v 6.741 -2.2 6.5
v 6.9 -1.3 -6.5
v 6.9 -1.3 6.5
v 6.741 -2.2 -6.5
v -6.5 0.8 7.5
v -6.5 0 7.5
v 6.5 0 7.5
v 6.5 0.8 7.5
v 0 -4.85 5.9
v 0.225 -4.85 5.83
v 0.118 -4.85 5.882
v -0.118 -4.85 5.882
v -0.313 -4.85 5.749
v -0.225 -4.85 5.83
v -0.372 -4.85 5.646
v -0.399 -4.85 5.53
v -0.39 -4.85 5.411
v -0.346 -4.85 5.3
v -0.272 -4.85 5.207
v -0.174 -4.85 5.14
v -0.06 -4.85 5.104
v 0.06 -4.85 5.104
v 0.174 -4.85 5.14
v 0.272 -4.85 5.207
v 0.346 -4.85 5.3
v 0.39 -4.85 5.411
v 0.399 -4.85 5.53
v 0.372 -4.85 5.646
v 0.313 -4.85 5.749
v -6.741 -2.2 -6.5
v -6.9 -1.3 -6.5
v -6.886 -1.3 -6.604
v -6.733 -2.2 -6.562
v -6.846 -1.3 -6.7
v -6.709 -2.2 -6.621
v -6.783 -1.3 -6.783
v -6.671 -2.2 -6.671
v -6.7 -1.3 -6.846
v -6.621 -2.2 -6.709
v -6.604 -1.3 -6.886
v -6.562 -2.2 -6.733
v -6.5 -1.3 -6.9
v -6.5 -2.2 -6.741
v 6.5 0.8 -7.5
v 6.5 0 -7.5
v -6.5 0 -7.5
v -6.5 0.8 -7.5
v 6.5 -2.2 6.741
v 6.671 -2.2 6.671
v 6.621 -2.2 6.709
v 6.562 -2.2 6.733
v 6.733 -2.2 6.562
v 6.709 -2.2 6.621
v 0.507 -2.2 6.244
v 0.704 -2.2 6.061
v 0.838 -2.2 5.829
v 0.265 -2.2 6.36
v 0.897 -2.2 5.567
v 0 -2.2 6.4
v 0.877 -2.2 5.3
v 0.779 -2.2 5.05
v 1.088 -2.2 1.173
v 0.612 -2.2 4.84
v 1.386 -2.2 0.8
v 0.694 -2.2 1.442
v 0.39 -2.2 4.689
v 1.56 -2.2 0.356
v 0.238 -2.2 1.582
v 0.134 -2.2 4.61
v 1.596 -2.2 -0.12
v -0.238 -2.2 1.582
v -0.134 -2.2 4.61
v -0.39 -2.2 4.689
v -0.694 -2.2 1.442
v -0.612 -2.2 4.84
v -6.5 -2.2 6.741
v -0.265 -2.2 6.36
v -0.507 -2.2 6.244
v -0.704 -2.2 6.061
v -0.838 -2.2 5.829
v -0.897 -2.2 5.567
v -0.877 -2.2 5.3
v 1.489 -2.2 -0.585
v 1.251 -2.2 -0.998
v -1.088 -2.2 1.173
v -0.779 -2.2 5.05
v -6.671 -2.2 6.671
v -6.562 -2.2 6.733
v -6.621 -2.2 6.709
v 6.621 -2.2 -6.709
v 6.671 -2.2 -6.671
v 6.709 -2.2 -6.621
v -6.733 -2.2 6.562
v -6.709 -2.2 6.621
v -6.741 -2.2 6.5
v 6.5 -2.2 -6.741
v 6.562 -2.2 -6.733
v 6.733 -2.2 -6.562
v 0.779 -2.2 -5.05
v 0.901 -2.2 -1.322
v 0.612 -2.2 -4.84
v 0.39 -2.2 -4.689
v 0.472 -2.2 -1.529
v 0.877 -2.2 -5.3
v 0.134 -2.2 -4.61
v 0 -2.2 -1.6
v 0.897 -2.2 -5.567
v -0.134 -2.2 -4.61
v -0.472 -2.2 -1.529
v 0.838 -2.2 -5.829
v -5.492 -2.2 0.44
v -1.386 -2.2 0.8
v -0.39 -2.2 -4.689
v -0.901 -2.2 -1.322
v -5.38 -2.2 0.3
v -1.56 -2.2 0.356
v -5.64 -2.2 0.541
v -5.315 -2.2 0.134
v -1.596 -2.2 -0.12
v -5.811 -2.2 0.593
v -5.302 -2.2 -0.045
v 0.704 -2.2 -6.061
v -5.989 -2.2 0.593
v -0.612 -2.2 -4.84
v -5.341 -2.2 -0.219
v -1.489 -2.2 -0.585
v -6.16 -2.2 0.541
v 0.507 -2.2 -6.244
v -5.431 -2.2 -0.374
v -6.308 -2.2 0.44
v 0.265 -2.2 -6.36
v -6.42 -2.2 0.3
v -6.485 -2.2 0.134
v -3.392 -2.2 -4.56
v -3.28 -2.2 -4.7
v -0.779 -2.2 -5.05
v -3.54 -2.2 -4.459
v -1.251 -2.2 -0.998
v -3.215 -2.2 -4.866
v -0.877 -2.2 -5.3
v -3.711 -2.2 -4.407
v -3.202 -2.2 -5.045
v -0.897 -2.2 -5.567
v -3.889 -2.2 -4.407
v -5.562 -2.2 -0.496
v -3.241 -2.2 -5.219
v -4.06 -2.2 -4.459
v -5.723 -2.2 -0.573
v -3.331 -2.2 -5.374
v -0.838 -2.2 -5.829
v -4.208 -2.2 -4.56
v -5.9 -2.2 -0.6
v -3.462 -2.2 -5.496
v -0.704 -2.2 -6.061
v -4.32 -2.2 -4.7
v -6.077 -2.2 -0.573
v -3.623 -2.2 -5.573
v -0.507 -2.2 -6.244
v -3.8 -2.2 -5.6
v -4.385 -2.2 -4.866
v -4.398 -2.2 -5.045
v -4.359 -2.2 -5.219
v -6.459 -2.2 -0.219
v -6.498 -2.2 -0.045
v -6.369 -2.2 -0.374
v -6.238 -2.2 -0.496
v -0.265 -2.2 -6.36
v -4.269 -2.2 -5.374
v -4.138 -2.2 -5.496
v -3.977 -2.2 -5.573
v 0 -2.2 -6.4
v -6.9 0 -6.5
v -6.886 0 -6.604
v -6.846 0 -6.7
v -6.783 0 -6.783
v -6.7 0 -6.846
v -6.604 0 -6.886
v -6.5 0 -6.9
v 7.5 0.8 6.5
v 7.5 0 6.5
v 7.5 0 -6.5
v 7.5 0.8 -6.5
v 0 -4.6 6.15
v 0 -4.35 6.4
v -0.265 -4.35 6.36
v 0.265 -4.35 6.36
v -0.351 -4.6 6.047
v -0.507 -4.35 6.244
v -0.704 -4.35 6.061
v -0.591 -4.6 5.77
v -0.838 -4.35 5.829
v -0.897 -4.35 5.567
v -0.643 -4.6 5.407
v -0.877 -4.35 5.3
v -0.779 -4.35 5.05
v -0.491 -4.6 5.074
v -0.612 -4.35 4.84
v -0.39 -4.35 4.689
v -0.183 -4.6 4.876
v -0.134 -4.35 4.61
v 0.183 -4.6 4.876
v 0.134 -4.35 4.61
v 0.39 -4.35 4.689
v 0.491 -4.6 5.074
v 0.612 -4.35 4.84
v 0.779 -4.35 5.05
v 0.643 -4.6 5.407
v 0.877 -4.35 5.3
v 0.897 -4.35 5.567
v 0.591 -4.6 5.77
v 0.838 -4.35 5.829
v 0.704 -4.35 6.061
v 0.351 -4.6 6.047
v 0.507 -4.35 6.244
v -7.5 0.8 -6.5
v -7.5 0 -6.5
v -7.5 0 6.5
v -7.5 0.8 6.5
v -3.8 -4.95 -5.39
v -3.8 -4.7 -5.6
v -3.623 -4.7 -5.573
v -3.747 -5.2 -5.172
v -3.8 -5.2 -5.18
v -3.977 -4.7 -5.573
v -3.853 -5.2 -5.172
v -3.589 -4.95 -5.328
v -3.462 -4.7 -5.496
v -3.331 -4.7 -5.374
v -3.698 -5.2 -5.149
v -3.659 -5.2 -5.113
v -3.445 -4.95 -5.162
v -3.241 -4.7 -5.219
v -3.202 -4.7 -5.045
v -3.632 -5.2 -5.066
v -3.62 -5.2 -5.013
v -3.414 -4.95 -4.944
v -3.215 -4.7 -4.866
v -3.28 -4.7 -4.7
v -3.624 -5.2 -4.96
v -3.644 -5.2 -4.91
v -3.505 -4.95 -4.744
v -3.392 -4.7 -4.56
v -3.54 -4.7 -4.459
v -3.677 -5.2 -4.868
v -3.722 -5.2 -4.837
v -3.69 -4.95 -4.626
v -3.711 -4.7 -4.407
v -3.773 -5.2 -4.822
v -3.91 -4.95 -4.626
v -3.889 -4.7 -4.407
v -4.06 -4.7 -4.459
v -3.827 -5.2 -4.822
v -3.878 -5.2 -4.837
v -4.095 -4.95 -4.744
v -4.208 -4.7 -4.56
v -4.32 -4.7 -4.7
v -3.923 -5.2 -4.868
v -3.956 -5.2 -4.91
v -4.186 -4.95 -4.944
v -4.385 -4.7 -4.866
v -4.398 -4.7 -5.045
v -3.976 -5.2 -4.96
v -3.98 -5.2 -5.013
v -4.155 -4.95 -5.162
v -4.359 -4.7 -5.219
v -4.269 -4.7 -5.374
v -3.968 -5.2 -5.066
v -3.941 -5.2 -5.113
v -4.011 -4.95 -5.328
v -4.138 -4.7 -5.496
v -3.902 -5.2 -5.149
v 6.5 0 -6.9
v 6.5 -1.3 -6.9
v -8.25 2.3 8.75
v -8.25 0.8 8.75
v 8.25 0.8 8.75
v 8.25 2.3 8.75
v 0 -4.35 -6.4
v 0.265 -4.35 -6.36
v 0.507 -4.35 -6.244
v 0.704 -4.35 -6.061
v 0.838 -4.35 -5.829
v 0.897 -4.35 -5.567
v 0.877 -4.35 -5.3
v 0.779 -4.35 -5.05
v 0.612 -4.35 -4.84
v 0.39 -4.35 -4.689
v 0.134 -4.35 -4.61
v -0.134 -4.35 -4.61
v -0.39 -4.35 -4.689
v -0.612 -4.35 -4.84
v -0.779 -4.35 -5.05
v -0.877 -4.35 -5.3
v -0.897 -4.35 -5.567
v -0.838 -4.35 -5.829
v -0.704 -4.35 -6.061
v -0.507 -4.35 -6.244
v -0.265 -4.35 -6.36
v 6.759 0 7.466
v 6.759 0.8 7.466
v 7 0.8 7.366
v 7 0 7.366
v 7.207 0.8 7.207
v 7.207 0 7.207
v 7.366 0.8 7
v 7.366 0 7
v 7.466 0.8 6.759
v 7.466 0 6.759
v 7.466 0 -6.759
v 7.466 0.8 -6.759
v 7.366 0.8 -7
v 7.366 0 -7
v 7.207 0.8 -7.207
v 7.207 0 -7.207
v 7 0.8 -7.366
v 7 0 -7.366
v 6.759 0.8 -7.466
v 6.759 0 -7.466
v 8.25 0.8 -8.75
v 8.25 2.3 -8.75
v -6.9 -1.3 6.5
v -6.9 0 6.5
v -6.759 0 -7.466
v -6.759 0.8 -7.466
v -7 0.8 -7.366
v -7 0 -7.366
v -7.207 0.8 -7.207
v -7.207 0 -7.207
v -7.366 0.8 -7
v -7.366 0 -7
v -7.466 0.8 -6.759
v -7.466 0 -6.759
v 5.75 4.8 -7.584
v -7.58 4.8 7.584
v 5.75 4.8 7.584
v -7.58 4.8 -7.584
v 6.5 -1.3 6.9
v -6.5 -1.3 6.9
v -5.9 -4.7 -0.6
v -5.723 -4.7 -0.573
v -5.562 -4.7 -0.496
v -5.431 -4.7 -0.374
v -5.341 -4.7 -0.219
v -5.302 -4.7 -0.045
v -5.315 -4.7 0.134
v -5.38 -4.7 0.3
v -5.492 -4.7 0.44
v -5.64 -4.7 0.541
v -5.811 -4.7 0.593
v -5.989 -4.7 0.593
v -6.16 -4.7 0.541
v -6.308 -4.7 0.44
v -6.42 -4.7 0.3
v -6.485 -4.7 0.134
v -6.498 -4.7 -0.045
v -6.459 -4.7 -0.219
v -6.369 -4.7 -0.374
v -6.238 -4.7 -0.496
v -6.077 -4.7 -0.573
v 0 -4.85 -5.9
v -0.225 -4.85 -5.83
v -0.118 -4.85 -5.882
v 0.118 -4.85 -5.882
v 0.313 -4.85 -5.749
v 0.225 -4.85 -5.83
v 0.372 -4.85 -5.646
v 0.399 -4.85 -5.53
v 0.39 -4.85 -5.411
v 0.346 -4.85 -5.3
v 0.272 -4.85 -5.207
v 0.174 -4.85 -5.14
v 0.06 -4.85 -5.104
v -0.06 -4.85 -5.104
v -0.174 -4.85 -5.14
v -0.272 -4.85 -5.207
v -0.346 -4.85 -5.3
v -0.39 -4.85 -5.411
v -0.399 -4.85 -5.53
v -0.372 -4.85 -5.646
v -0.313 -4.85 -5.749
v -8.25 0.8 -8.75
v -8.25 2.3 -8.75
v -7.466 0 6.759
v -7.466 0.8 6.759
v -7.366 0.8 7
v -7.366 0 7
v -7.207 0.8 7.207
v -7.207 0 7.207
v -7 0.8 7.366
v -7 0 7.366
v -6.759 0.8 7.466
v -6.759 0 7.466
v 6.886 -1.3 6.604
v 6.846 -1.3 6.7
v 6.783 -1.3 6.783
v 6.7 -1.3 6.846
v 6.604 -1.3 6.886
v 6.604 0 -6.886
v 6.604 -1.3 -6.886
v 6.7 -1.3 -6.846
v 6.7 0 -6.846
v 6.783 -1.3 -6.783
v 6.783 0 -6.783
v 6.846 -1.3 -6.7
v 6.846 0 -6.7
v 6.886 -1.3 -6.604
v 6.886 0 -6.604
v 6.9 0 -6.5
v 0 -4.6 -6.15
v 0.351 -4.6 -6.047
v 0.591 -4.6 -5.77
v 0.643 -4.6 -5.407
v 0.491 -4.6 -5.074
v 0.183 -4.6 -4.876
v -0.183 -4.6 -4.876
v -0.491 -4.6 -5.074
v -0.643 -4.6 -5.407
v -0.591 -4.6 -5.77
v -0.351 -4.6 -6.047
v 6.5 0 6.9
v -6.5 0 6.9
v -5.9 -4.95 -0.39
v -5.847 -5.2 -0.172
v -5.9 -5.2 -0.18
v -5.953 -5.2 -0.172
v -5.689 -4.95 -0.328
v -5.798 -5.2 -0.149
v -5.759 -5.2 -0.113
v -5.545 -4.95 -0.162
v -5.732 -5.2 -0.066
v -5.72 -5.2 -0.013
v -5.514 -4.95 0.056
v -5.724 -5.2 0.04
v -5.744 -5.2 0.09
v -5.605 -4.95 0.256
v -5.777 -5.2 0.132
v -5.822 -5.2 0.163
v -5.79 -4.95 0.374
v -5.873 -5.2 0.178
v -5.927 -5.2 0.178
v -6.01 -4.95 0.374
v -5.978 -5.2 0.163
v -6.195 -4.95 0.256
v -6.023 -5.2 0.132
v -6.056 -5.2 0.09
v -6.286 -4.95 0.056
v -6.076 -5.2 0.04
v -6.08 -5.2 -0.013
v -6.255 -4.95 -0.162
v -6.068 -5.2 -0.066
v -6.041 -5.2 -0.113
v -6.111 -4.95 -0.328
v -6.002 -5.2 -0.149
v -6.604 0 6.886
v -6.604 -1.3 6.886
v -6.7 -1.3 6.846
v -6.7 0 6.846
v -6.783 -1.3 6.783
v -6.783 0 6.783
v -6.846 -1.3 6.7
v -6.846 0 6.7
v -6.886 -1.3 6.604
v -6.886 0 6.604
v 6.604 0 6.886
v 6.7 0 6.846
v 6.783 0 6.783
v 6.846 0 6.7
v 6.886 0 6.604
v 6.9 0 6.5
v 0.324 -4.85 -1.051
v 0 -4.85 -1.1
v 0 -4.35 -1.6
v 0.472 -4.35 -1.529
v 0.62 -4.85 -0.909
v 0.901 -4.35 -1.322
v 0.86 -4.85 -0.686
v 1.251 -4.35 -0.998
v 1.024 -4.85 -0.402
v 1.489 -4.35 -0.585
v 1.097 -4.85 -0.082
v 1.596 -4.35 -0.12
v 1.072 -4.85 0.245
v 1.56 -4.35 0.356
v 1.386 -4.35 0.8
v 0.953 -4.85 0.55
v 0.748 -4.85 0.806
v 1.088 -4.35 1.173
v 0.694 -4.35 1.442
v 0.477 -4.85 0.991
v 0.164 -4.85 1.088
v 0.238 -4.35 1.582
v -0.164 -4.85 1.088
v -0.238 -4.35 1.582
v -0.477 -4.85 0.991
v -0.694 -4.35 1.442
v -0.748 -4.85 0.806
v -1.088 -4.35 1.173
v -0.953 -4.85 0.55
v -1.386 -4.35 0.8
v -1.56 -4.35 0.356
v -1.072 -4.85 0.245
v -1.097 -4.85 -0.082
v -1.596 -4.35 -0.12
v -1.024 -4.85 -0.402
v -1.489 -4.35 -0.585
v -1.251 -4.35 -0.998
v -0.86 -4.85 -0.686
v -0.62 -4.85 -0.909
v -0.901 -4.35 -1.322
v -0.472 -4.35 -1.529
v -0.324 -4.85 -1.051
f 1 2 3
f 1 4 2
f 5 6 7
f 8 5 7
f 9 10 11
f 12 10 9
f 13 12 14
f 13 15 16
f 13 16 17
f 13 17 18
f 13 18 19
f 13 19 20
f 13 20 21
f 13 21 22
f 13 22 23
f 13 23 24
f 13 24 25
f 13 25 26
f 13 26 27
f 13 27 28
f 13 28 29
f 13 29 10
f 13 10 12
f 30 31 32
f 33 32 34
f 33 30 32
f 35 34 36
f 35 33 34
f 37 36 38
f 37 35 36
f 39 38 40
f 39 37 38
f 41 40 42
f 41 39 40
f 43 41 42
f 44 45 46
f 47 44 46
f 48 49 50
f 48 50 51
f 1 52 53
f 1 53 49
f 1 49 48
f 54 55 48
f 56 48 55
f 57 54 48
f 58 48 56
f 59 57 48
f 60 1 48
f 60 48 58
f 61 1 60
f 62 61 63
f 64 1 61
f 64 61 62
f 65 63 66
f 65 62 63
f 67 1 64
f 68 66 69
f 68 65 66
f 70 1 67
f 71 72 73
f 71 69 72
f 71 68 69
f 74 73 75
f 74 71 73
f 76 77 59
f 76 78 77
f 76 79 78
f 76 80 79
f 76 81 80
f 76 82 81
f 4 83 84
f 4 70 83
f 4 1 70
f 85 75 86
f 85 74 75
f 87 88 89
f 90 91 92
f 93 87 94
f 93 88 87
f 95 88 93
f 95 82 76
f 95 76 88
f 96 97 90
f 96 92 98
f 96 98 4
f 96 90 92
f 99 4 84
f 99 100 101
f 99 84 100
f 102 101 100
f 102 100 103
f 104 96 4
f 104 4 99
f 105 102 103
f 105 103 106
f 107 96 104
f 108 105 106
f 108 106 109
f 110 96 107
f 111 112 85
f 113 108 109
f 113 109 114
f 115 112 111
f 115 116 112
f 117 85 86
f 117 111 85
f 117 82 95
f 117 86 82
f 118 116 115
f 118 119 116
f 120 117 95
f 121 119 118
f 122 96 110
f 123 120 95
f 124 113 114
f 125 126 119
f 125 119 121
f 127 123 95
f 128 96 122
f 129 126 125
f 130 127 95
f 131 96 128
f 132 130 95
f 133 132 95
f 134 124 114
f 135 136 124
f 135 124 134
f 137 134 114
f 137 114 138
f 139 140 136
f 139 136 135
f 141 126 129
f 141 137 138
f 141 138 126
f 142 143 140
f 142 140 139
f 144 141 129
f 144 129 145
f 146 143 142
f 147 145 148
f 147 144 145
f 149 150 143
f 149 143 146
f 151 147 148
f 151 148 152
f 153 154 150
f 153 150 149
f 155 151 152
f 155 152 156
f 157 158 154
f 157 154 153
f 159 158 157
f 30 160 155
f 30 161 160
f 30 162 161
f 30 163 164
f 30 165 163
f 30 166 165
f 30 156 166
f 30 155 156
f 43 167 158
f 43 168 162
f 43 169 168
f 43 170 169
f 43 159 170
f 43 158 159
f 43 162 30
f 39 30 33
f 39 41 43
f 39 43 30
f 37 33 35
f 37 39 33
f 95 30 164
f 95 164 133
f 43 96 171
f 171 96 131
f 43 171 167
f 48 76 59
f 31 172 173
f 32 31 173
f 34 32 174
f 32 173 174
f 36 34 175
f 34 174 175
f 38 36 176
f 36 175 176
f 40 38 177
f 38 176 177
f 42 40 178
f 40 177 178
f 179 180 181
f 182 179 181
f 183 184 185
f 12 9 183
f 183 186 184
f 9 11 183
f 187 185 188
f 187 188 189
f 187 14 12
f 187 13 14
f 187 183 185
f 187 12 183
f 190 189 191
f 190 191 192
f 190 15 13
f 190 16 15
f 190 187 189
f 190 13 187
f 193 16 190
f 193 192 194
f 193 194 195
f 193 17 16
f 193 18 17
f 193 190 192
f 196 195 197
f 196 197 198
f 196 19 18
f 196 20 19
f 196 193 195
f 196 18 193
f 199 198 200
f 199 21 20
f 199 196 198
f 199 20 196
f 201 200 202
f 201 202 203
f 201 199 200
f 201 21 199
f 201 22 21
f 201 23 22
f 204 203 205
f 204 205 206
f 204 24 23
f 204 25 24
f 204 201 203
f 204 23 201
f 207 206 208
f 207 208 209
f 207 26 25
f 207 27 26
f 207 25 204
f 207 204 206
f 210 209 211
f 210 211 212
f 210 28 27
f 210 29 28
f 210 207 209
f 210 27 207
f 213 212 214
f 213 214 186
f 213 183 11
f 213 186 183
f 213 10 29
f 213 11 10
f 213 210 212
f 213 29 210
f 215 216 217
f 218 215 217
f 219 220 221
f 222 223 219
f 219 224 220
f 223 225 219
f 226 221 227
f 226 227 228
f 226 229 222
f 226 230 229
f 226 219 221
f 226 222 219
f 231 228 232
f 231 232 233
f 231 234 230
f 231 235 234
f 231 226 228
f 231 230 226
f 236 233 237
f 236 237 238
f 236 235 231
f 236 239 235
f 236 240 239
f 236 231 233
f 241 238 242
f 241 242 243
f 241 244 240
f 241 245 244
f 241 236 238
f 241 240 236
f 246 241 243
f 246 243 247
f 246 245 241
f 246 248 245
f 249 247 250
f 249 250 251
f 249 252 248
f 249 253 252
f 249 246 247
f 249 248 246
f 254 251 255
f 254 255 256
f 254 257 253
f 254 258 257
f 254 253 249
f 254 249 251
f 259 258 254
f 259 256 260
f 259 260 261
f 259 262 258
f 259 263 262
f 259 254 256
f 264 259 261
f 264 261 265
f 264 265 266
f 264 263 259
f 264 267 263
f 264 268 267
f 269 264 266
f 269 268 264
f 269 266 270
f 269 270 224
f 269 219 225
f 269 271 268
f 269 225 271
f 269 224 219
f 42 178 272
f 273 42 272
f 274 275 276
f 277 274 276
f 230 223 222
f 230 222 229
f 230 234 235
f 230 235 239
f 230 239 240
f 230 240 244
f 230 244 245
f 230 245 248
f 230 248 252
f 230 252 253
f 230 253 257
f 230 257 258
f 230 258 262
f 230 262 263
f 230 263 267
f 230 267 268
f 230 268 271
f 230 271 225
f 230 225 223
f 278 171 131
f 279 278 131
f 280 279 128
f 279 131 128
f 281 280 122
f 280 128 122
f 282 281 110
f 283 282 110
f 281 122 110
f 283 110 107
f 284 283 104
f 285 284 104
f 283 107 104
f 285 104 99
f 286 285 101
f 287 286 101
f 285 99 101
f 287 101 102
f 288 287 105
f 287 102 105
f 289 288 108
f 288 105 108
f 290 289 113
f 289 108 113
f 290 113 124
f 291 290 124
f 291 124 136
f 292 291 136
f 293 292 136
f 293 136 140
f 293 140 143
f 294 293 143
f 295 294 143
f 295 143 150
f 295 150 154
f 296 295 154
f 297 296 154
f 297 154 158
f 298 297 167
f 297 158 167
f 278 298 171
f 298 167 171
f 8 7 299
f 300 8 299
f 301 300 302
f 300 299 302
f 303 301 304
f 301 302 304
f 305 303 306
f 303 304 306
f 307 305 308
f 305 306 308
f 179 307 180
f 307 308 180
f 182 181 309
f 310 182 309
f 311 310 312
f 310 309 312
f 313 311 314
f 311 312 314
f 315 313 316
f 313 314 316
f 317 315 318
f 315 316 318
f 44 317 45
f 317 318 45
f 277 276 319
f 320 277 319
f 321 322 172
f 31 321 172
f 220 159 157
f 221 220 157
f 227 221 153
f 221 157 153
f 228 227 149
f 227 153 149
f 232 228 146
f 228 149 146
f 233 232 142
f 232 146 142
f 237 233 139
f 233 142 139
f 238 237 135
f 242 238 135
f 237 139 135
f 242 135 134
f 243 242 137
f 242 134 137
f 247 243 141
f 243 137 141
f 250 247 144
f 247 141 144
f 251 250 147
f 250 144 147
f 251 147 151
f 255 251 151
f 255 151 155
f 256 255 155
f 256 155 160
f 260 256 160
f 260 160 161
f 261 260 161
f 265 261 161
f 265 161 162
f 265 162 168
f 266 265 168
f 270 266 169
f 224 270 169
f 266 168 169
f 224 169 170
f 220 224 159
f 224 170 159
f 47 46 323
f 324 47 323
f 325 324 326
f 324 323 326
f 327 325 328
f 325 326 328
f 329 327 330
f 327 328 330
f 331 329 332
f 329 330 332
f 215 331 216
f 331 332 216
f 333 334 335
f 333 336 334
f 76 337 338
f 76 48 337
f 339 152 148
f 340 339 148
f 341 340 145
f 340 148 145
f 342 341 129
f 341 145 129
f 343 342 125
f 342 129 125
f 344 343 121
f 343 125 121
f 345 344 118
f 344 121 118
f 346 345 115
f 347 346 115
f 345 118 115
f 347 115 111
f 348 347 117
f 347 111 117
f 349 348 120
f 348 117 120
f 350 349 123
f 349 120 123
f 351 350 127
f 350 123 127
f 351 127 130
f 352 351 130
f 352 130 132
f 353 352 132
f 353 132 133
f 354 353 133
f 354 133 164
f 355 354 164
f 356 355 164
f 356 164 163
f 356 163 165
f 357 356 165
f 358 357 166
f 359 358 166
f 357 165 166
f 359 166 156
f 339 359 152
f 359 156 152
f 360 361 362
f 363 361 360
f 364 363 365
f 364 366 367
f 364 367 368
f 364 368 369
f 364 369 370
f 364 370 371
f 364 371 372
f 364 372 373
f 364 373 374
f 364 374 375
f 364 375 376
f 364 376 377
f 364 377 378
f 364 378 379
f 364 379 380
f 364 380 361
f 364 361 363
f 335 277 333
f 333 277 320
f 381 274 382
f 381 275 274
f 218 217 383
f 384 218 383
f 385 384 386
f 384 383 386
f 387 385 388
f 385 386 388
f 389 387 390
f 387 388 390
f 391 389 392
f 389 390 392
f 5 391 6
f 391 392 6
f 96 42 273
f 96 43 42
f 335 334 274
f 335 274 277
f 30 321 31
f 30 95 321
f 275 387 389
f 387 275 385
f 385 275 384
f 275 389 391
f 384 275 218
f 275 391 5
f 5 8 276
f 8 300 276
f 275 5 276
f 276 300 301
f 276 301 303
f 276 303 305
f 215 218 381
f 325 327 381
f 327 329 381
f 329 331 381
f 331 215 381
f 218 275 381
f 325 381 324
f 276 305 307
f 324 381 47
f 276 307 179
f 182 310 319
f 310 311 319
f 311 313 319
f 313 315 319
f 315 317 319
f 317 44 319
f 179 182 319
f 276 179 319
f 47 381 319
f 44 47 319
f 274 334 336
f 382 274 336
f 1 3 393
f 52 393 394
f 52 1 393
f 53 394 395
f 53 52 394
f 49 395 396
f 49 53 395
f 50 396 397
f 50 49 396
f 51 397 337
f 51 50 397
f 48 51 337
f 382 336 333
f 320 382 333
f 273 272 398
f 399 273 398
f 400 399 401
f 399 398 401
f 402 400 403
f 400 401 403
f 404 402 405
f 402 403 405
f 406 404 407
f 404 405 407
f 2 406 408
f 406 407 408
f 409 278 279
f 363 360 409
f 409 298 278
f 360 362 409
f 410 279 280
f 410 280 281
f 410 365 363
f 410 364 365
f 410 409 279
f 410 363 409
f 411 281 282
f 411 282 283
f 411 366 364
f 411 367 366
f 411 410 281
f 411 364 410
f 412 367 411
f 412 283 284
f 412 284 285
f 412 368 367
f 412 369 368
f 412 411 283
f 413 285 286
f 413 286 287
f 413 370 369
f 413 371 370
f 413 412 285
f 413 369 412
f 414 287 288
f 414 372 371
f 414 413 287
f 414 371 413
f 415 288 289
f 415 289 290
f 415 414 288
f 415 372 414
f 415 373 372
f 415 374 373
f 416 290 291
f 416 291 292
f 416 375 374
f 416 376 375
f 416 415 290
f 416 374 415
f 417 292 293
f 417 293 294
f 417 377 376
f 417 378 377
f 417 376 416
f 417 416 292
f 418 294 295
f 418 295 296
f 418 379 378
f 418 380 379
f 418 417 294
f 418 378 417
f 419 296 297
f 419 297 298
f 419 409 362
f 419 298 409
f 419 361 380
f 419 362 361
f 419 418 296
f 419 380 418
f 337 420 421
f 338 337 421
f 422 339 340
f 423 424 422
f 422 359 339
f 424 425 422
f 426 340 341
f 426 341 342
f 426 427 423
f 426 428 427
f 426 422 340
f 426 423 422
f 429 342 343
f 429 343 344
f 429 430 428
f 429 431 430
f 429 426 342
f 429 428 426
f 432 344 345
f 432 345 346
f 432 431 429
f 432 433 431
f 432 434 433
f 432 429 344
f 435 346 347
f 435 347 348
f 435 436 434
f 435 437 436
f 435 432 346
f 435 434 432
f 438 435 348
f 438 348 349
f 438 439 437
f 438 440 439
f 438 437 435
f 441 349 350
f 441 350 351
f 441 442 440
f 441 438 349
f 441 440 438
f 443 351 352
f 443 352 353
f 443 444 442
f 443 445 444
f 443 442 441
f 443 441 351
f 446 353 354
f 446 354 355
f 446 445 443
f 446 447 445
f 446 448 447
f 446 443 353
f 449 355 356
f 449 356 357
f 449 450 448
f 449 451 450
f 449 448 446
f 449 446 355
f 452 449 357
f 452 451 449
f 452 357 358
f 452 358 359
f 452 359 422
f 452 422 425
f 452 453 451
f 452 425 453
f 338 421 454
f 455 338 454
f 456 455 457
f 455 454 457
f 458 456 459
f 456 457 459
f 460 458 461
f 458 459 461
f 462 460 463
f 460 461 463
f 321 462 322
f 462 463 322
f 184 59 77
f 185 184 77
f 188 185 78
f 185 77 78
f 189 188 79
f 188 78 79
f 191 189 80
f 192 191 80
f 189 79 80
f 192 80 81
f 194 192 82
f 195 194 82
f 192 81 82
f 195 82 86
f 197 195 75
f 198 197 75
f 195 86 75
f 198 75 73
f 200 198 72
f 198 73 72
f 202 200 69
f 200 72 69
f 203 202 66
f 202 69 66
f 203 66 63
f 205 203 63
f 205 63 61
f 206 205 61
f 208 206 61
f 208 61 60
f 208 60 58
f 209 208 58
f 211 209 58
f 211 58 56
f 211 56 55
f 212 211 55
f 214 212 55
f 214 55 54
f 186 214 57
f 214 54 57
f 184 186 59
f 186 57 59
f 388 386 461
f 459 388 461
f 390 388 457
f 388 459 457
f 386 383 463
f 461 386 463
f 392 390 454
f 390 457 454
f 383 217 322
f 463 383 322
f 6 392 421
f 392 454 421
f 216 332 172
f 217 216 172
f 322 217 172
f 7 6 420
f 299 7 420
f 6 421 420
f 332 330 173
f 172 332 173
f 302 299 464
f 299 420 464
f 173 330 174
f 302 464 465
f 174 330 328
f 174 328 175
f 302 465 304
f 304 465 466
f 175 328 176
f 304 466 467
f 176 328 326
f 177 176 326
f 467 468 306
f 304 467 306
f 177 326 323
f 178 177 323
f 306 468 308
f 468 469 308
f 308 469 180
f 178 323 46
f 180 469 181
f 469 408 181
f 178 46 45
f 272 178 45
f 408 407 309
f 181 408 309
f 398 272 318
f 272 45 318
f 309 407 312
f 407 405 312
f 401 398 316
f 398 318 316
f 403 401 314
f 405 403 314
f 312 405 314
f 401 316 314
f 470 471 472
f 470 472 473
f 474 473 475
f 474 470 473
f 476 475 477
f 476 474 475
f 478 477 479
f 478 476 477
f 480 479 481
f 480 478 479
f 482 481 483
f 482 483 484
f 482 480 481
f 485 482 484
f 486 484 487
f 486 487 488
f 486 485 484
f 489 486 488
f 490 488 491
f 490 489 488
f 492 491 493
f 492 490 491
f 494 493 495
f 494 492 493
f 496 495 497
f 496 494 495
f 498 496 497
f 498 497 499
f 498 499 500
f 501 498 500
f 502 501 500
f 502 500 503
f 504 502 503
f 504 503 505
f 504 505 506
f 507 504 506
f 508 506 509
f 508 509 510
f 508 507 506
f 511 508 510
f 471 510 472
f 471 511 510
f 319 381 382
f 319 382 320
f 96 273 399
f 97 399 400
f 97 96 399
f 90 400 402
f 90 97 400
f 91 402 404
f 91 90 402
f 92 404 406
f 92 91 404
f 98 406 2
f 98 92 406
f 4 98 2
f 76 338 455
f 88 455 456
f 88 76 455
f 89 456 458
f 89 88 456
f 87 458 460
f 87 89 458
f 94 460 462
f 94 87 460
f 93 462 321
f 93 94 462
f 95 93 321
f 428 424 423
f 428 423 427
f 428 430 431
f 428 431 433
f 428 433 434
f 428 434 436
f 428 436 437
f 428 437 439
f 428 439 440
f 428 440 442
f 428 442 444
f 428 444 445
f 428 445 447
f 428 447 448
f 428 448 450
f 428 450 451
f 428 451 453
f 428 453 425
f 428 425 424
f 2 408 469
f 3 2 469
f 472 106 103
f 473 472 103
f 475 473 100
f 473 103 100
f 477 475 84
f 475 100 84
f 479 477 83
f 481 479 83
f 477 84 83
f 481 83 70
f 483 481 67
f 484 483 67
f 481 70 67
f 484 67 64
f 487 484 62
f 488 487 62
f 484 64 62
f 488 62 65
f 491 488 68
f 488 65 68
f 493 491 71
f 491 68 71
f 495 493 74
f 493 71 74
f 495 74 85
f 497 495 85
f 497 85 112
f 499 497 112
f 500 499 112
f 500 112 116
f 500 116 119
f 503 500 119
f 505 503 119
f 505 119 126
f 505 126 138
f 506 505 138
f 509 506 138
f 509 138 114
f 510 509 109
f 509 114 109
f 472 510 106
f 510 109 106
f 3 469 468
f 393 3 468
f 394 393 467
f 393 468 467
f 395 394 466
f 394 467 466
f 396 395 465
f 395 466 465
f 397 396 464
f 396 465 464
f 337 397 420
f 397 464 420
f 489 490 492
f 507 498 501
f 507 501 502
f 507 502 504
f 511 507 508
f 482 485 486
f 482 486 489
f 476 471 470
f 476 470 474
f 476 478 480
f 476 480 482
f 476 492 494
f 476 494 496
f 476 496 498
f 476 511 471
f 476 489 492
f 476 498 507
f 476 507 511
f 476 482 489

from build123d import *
from OCP.BRepFilletAPI import BRepFilletAPI_MakeChamfer

# Parameters (mm, degrees)
BOSS_EXTRUDE1_DEPTH = 0.8
BOSS_EXTRUDE2_DEPTH = 1.3
BOSS_EXTRUDE3_DEPTH = 0.9
BOSS_EXTRUDE3_TAPER = 10
SKETCH4_R           = 1.6
SKETCH4_R_2         = 0.9
BOSS_EXTRUDE4_DEPTH = 2.65
SKETCH5_R           = 0.6
BOSS_EXTRUDE5_DEPTH = 3
CHAMFER1_SIZE       = 0.5
CHAMFER1_SIZE2      = 0.419549816
CHAMFER2_SIZE       = 0.5
SKETCH6_W           = 16.5
SKETCH6_H           = 17.5
BOSS_EXTRUDE6_DEPTH = 4
CHAMFER3_SIZE       = 2.5
CHAMFER4_SIZE       = 2.5
CHAMFER4_SIZE2      = 1.165769145
CHAMFER5_SIZE       = 2.5
CHAMFER5_SIZE2      = 0.669872981


with BuildPart() as part:
    # Sketch1 → Boss-Extrude1 (new body)
    with BuildSketch(Plane(origin=(0, 0, 0), x_dir=(1, 0, 0), z_dir=(0, 1, 0))):
        with BuildLine():
            Line((-6.5, -7.5), (6.5, -7.5))
            ThreePointArc((6.5, -7.5), (7.207106781, -7.207106781), (7.5, -6.5))
            Line((7.5, -6.5), (7.5, 6.5))
            ThreePointArc((7.5, 6.5), (7.207106781, 7.207106781), (6.5, 7.5))
            Line((6.5, 7.5), (-6.5, 7.5))
            ThreePointArc((-6.5, 7.5), (-7.207106781, 7.207106781), (-7.5, 6.5))
            Line((-7.5, 6.5), (-7.5, -6.5))
            ThreePointArc((-7.5, -6.5), (-7.207106781, -7.207106781), (-6.5, -7.5))
        make_face()
    extrude(amount=BOSS_EXTRUDE1_DEPTH)

    # Sketch2 → Boss-Extrude2 (add)
    with BuildSketch(Plane.XZ):
        with BuildLine():
            Line((-6.9, 6.5), (-6.9, -6.5))
            ThreePointArc((-6.9, -6.5), (-6.782842712, -6.782842712), (-6.5, -6.9))
            Line((-6.5, -6.9), (6.5, -6.9))
            ThreePointArc((6.5, -6.9), (6.782842712, -6.782842712), (6.9, -6.5))
            Line((6.9, -6.5), (6.9, 6.5))
            ThreePointArc((6.9, 6.5), (6.782842712, 6.782842712), (6.5, 6.9))
            Line((6.5, 6.9), (-6.5, 6.9))
            ThreePointArc((-6.5, 6.9), (-6.782842712, 6.782842712), (-6.9, 6.5))
        make_face()
    extrude(amount=BOSS_EXTRUDE2_DEPTH)

    # Sketch3 → Boss-Extrude3 (add)
    with BuildSketch(Plane.XZ.offset(1.3)):
        with BuildLine():
            Line((-6.9, 6.5), (-6.9, -6.5))
            ThreePointArc((-6.9, -6.5), (-6.782842712, -6.782842712), (-6.5, -6.9))
            Line((-6.5, -6.9), (6.5, -6.9))
            ThreePointArc((6.5, -6.9), (6.782842712, -6.782842712), (6.9, -6.5))
            Line((6.9, -6.5), (6.9, 6.5))
            ThreePointArc((6.9, 6.5), (6.782842712, 6.782842712), (6.5, 6.9))
            Line((6.5, 6.9), (-6.5, 6.9))
            ThreePointArc((-6.5, 6.9), (-6.782842712, 6.782842712), (-6.9, 6.5))
        make_face()
    extrude(amount=BOSS_EXTRUDE3_DEPTH, taper=BOSS_EXTRUDE3_TAPER)

    # Sketch4 → Boss-Extrude4 (add)
    with BuildSketch(Plane.XZ.offset(2.2)):
        with Locations(Location((0, 0, 0), (0, 0, 270))):
            Circle(SKETCH4_R)
        with Locations(Location((0, -5.5, 0), (0, 0, 270))):
            Circle(SKETCH4_R_2)
        with Locations(Location((0, 5.5, 0), (0, 0, 90))):
            Circle(SKETCH4_R_2)
    extrude(amount=BOSS_EXTRUDE4_DEPTH)

    # Sketch5 → Boss-Extrude5 (add)
    with BuildSketch(Plane.XZ.offset(2.2)):
        with Locations(Location((-5.9, 0, 0), (0, 0, 270))):
            Circle(SKETCH5_R)
        with Locations(Location((-3.8, -5, 0), (0, 0, 270))):
            Circle(SKETCH5_R)
    extrude(amount=BOSS_EXTRUDE5_DEPTH)

    # Chamfer1: one chamfer whose edges measure the first distance from different faces: ONE call of the kernel's chamfer builder (chamfer() names one face for all edges)
    chamfer1_edges_1 = [part.edges().sort_by_distance(p)[0] for p in [
        (-5.9, -5.2, 0.6),
    ]]
    chamfer1_side_1 = [part.faces().sort_by_distance(p)[0] for p in [
        (-5.9, -3.7, 0.6),
    ]]
    chamfer1_edges_2 = [part.edges().sort_by_distance(p)[0] for p in [
        (-3.8, -5.2, -4.4),
    ]]
    chamfer1_side_2 = [part.faces().sort_by_distance(p)[0] for p in [
        (-3.8, -3.7, -4.4),
    ]]
    chamfer1 = BRepFilletAPI_MakeChamfer(part.part.solid().wrapped)
    for e in chamfer1_edges_1:
        chamfer1.Add(CHAMFER1_SIZE, CHAMFER1_SIZE2, e.wrapped, chamfer1_side_1[0].wrapped)  # the first distance lies on this face
    for e in chamfer1_edges_2:
        chamfer1.Add(CHAMFER1_SIZE, CHAMFER1_SIZE2, e.wrapped, chamfer1_side_2[0].wrapped)  # the first distance lies on this face
    add(Compound.cast(chamfer1.Shape()), mode=Mode.REPLACE)

    # Chamfer2
    chamfer2_edges = [part.edges().sort_by_distance(p)[0] for p in [
        (0, -4.85, 1.6),
        (0, -4.85, -4.6),
        (0, -4.85, 4.6),
    ]]
    chamfer(chamfer2_edges, length=CHAMFER2_SIZE)

    # Sketch6 → Boss-Extrude6 (add)
    with BuildSketch(Plane(origin=(0, 0.8, 0), x_dir=(1, 0, 0), z_dir=(0, 1, 0))):
        Rectangle(SKETCH6_W, SKETCH6_H)
    extrude(amount=BOSS_EXTRUDE6_DEPTH)

    # Chamfer3
    chamfer3_edges = [part.edges().sort_by_distance(p)[0] for p in [
        (8.25, 4.8, 0),
    ]]
    chamfer(chamfer3_edges, length=CHAMFER3_SIZE)

    # Chamfer4: one chamfer whose edges measure the first distance from different faces: ONE call of the kernel's chamfer builder (chamfer() names one face for all edges)
    chamfer4_edges_1 = [part.edges().sort_by_distance(p)[0] for p in [
        (-1.25, 4.8, -8.75),
    ]]
    chamfer4_side_1 = [part.faces().sort_by_distance(p)[0] for p in [
        (-0.368621604, 2.742014579, -8.75),
    ]]
    chamfer4_edges_2 = [part.edges().sort_by_distance(p)[0] for p in [
        (-1.25, 4.8, 8.75),
    ]]
    chamfer4_side_2 = [part.faces().sort_by_distance(p)[0] for p in [
        (-0.368621604, 2.742014579, 8.75),
    ]]
    chamfer4 = BRepFilletAPI_MakeChamfer(part.part.solid().wrapped)
    for e in chamfer4_edges_1:
        chamfer4.Add(CHAMFER4_SIZE, CHAMFER4_SIZE2, e.wrapped, chamfer4_side_1[0].wrapped)  # the first distance lies on this face
    for e in chamfer4_edges_2:
        chamfer4.Add(CHAMFER4_SIZE, CHAMFER4_SIZE2, e.wrapped, chamfer4_side_2[0].wrapped)  # the first distance lies on this face
    add(Compound.cast(chamfer4.Shape()), mode=Mode.REPLACE)

    # Chamfer5
    chamfer5_edges = [part.edges().sort_by_distance(p)[0] for p in [
        (-8.25, 4.8, 0),
    ]]
    chamfer5_side = [part.faces().sort_by_distance(p)[0] for p in [
        (-8.25, 2.74931608, 0),
    ]]
    chamfer(chamfer5_edges, length=CHAMFER5_SIZE, length2=CHAMFER5_SIZE2, reference=chamfer5_side[0])


solid = part.part
